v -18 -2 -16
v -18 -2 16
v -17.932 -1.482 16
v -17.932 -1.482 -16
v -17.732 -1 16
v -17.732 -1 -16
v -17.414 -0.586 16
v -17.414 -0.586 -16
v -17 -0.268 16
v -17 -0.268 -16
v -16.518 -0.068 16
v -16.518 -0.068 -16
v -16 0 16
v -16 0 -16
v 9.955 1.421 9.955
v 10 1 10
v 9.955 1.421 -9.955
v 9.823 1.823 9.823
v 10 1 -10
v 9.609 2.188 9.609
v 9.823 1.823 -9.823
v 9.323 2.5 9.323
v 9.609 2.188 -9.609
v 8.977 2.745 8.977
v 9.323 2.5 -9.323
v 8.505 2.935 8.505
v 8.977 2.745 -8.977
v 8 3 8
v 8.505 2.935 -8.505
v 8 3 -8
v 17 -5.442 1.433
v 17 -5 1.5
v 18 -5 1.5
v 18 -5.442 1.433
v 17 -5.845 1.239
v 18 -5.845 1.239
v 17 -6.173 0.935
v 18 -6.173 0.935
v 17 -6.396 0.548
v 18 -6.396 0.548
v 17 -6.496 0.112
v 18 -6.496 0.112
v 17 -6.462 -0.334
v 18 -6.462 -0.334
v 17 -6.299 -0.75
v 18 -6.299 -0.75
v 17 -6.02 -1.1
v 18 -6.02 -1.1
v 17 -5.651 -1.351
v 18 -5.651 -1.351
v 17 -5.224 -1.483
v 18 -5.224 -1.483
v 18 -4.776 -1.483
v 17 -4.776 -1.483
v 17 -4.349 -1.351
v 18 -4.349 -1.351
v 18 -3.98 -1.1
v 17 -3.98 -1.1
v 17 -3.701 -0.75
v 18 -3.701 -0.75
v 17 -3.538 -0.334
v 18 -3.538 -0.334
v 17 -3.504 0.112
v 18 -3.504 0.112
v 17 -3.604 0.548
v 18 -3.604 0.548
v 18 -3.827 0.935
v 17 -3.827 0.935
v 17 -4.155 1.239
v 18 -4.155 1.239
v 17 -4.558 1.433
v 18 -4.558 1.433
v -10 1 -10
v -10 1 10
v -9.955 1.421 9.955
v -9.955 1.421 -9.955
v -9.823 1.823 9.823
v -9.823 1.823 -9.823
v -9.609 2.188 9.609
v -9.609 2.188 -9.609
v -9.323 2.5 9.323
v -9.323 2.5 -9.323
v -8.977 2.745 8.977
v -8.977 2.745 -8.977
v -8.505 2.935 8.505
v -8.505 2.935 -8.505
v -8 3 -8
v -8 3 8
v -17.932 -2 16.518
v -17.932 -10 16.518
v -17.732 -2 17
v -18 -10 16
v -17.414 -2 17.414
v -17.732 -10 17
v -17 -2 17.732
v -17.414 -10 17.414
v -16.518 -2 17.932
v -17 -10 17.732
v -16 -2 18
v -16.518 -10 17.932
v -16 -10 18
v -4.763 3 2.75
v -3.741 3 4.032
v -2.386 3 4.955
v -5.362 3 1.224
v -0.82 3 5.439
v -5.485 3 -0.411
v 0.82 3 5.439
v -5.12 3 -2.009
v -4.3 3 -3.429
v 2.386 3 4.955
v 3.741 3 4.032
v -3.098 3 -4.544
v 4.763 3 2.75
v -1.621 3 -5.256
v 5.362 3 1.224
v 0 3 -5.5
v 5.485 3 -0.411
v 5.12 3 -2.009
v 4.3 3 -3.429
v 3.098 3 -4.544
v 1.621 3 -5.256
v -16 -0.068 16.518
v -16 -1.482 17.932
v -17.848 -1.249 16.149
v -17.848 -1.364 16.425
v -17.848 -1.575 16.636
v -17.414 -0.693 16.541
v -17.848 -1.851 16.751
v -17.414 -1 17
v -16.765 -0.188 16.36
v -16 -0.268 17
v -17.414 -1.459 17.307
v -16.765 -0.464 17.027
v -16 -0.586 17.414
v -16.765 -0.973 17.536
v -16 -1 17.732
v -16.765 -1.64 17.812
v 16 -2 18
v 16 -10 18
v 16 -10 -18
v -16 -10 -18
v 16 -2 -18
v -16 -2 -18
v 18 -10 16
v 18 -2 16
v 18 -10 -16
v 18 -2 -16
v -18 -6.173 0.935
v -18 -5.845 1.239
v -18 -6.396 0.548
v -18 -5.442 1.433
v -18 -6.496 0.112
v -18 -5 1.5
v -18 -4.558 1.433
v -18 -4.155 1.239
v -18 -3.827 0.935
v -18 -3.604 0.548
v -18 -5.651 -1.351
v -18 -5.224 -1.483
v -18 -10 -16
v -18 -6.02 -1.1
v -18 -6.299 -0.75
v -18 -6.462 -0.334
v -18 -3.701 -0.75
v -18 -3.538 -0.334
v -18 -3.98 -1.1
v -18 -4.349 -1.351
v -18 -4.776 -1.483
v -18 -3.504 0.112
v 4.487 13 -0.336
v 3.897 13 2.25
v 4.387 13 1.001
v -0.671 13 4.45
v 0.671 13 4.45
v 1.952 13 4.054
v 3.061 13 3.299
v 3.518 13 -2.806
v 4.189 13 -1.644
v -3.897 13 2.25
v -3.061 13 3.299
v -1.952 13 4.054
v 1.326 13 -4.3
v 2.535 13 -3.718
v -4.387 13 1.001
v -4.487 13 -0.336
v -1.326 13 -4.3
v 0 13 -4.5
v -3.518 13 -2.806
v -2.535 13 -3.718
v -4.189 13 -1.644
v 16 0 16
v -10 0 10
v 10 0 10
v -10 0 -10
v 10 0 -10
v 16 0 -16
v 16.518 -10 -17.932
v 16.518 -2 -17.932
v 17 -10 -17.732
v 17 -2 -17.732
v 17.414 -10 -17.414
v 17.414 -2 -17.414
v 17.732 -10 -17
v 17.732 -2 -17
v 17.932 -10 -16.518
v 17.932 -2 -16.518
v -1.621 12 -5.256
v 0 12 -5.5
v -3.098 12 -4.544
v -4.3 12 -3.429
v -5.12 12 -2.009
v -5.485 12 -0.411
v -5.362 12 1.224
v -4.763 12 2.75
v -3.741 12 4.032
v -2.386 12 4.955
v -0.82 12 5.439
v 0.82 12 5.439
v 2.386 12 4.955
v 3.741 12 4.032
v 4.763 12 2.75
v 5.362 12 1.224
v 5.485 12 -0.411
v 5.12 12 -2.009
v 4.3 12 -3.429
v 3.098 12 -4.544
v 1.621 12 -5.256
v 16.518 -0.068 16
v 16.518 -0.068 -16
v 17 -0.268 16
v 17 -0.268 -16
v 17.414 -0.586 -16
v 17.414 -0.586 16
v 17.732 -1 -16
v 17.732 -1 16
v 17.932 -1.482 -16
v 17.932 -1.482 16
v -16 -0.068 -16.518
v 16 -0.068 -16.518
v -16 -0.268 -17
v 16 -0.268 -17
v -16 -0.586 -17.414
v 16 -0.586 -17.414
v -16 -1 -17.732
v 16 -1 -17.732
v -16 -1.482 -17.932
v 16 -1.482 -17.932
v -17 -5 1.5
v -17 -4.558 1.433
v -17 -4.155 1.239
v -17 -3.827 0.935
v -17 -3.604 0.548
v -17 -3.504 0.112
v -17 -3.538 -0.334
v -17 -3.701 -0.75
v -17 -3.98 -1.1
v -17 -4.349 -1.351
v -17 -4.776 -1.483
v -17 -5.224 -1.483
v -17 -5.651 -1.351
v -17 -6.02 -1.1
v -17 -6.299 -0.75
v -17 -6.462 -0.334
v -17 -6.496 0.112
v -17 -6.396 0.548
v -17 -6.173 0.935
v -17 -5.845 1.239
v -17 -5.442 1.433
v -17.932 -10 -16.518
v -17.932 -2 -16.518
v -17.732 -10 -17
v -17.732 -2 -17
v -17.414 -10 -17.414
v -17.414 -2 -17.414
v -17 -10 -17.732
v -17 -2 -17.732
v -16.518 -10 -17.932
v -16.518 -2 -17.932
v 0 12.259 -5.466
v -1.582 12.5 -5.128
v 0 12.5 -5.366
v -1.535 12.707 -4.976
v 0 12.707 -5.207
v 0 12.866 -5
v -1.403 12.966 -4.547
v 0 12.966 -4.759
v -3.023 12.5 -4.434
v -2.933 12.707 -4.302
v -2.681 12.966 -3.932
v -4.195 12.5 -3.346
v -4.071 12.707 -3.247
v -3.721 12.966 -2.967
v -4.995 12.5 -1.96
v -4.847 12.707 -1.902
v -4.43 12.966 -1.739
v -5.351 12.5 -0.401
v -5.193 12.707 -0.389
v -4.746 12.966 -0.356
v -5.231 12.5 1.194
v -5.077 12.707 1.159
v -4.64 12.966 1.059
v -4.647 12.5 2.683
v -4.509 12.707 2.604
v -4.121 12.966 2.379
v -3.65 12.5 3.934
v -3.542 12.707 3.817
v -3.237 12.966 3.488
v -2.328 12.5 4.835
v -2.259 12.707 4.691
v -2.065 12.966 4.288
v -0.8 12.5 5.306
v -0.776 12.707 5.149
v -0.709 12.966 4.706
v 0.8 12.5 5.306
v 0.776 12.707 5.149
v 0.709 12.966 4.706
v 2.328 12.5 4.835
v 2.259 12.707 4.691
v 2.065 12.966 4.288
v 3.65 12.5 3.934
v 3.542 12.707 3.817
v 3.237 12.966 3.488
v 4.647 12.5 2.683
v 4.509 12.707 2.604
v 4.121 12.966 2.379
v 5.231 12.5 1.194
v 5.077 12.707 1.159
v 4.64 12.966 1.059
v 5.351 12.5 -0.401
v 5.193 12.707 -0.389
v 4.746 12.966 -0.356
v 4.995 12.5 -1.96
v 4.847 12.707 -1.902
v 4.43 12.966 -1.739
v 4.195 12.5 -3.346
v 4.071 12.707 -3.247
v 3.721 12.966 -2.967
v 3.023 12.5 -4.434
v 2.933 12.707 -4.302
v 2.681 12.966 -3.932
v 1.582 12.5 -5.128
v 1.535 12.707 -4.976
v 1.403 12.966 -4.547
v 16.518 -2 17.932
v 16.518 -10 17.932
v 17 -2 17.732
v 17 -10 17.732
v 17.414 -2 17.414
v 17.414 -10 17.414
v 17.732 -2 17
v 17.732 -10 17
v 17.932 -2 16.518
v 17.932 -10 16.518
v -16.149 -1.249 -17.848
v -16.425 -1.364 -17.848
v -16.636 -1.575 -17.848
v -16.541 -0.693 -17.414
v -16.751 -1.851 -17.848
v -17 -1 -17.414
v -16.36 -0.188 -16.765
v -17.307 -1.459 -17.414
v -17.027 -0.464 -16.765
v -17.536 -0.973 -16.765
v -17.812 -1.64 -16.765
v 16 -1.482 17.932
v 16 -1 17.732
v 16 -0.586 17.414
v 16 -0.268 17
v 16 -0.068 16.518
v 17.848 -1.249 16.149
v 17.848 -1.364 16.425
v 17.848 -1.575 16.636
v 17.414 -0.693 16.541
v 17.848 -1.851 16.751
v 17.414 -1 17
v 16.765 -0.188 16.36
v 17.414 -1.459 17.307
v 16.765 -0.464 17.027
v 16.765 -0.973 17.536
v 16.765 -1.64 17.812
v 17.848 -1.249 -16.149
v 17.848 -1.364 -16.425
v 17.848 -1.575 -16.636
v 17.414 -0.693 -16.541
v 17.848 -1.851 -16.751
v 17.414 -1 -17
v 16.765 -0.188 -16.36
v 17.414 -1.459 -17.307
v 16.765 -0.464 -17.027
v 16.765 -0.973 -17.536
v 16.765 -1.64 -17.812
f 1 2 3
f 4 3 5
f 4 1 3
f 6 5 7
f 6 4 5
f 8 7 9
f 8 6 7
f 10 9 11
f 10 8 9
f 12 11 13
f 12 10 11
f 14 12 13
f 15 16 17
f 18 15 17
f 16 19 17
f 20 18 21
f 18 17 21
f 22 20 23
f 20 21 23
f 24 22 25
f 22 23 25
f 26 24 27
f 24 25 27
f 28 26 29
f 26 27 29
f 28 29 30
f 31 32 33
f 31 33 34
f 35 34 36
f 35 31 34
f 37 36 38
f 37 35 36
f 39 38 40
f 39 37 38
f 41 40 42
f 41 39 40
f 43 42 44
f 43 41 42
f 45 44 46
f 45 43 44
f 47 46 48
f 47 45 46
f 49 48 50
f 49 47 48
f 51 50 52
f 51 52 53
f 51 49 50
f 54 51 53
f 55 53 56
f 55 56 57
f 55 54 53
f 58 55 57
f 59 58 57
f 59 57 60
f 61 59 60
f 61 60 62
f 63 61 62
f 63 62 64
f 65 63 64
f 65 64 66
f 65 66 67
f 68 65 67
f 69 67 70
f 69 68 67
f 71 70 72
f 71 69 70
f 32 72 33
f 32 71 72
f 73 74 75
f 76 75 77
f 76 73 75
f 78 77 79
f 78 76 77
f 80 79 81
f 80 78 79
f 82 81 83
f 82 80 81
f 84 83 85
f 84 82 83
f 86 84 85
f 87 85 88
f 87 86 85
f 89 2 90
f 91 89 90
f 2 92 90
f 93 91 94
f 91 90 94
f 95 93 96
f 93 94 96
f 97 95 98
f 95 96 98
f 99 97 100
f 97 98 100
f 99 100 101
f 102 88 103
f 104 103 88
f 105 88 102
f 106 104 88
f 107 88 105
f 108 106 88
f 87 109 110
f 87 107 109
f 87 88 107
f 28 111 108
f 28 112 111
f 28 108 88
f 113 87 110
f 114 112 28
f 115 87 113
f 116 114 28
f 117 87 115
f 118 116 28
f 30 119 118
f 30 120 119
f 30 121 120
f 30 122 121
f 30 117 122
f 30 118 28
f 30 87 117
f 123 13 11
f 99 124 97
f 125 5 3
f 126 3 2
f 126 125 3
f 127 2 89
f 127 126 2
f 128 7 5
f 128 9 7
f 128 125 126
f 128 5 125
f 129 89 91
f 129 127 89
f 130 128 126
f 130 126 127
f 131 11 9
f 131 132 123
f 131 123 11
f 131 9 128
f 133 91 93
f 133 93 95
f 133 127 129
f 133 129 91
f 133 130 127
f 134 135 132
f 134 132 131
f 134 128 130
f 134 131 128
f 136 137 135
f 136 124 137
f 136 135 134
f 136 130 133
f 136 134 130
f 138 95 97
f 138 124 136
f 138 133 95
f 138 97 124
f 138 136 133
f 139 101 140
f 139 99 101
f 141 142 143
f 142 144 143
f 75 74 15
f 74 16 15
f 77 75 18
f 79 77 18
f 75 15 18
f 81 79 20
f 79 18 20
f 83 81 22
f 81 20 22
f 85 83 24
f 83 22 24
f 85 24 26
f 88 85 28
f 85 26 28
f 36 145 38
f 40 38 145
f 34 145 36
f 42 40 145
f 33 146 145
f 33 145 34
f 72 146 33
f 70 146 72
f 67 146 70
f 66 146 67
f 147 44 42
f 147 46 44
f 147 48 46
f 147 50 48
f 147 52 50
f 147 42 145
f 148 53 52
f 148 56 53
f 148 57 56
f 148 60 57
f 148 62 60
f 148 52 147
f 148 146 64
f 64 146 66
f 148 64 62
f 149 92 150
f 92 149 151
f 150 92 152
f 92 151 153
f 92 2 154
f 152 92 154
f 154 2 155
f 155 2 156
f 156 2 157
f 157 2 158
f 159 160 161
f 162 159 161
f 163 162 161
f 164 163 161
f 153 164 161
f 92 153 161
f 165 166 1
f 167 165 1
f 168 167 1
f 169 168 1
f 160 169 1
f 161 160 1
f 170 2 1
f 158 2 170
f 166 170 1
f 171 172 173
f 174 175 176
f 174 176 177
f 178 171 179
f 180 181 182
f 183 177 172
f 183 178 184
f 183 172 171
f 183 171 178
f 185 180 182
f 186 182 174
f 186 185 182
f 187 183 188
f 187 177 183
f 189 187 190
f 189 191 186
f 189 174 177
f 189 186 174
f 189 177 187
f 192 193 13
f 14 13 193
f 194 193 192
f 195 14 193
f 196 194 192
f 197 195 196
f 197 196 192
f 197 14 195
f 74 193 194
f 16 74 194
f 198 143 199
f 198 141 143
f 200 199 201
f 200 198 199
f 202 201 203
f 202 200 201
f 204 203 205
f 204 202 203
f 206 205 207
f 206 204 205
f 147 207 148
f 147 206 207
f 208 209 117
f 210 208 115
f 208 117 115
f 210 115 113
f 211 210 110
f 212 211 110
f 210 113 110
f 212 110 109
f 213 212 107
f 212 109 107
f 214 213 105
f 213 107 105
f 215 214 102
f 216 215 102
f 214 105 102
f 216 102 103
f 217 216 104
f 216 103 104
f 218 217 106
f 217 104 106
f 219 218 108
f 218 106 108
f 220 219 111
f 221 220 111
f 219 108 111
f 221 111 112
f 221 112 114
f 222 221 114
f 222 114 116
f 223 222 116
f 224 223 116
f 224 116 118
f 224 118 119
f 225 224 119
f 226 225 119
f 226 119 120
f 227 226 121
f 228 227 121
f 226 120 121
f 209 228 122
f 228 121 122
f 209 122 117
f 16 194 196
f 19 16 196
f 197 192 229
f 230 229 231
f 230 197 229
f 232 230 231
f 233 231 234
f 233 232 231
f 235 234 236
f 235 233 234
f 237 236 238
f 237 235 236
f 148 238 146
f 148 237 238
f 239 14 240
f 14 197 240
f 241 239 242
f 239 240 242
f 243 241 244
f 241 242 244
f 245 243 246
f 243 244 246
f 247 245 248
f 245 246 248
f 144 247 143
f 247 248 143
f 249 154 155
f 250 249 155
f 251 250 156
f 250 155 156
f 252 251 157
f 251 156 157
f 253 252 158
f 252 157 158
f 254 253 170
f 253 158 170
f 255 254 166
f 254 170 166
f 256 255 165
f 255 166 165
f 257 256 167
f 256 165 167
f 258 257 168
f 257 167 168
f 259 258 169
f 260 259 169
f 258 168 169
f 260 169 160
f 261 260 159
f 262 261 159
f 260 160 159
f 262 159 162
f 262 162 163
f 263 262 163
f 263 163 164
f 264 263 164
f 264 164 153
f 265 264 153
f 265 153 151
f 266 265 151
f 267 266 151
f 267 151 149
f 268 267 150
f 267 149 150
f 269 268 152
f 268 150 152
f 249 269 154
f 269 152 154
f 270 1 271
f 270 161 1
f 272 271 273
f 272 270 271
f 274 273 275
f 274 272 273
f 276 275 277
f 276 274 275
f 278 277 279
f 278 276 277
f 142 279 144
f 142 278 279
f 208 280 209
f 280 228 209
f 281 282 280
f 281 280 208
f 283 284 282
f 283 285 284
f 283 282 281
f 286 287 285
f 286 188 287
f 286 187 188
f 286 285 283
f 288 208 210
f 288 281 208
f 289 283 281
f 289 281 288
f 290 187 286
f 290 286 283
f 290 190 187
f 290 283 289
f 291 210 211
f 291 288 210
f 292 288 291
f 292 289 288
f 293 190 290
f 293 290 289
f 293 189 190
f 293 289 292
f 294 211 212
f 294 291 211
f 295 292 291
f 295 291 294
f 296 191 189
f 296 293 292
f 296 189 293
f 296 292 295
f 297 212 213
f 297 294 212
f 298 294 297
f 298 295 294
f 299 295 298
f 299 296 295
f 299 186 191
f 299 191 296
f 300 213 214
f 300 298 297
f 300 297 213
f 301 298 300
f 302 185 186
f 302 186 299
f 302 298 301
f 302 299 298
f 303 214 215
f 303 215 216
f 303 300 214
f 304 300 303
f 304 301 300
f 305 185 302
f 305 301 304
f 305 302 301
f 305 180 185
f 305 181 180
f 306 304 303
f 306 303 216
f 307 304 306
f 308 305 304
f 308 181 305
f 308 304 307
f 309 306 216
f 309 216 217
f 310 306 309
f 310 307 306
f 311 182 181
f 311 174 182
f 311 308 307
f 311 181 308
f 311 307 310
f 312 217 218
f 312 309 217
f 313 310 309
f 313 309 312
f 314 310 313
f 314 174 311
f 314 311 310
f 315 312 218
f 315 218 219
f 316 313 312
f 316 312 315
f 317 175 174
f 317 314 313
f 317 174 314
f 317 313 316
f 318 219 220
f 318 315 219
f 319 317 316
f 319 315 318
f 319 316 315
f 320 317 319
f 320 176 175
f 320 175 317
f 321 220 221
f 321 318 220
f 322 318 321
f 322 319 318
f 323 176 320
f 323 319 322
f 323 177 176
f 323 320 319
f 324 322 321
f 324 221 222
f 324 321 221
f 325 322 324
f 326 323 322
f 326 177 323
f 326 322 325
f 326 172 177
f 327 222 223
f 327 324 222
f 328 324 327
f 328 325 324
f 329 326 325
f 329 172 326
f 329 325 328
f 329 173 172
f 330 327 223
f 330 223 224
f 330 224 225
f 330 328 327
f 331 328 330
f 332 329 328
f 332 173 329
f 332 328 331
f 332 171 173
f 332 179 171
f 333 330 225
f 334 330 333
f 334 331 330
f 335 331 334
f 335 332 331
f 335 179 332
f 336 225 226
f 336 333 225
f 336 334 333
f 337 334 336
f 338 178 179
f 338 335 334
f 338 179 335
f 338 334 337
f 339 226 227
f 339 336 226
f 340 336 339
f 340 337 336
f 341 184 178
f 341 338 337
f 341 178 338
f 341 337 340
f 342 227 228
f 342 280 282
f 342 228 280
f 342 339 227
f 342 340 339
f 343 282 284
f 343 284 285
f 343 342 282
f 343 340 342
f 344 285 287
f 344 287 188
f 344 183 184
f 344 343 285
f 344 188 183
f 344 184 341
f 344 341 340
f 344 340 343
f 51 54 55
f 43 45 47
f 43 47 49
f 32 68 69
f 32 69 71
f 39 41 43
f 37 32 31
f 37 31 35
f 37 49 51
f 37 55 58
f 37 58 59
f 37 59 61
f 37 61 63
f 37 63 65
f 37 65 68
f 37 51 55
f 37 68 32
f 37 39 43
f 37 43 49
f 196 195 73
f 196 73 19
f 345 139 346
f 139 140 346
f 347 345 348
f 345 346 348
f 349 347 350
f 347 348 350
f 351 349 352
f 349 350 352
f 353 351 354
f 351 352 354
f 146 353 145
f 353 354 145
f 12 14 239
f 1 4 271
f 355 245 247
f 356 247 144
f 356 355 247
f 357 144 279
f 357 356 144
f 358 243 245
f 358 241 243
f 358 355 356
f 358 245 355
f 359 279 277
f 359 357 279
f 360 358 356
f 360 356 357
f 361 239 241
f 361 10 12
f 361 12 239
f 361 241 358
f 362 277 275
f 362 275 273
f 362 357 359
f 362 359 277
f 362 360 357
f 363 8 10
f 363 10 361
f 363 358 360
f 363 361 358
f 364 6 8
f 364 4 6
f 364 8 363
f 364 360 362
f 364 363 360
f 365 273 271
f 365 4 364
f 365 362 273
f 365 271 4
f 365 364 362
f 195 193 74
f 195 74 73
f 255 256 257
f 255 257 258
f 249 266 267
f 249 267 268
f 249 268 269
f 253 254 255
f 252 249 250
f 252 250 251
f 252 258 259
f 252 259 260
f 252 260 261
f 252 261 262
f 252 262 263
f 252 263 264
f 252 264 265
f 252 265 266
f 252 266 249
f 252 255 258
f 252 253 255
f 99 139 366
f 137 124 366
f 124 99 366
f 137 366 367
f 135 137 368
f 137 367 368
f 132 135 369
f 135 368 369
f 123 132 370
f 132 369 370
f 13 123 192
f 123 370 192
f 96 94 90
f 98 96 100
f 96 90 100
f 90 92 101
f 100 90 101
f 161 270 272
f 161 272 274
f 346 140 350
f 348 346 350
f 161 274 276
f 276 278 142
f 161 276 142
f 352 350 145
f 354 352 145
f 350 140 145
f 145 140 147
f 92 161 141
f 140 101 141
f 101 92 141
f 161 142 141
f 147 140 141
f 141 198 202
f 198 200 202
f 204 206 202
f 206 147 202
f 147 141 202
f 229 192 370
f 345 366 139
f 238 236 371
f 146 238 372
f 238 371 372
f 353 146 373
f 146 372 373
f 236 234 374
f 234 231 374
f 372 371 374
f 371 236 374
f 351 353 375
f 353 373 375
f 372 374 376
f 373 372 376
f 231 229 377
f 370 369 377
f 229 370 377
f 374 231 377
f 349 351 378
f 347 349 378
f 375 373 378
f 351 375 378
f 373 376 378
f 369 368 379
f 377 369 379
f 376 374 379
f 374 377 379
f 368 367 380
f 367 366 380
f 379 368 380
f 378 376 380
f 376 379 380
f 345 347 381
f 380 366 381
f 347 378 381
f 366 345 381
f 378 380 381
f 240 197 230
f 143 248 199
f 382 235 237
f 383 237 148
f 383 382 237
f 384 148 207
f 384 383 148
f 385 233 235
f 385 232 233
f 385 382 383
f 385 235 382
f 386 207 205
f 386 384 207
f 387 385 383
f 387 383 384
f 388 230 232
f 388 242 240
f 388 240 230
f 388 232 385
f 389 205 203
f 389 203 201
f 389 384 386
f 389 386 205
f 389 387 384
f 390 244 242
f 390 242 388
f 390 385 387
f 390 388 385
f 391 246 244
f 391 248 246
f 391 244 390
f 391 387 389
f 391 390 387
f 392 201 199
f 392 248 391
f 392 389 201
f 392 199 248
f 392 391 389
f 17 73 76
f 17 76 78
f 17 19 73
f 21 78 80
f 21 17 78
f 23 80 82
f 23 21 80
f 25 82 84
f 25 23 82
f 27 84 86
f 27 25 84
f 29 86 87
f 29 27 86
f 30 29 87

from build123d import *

# Parameters (mm, degrees)
SKETCH_1_W          = 36
SKETCH_1_H          = 36
EXTRUDE_1_DEPTH     = 10
SKETCH_2_W          = 20
SKETCH_2_H          = 20
EXTRUDE_2_DEPTH     = 3
SKETCH_3_R          = 5.5
EXTRUDE_4_DEPTH     = 10
SKETCH_4_R          = 1.5
CUT_EXTRUDE_1_DEPTH = 1
CUT_EXTRUDE_START   = -1
SKETCH_5_R          = 1.5
CUT_EXTRUDE_2_DEPTH = 1
FILLET_1_R          = 2
FILLET_2_R          = 1


with BuildPart() as part:
    # 草图1 → 凸台-拉伸1 (new body)
    with BuildSketch(Plane(origin=(0, 0, 0), x_dir=(1, 0, 0), z_dir=(0, 1, 0))):
        Rectangle(SKETCH_1_W, SKETCH_1_H)
    extrude(amount=-EXTRUDE_1_DEPTH)

    # 草图2 → 凸台-拉伸2 (add)
    with BuildSketch(Plane(origin=(0, 0, 0), x_dir=(1, 0, 0), z_dir=(0, 1, 0))):
        Rectangle(SKETCH_2_W, SKETCH_2_H)
    extrude(amount=EXTRUDE_2_DEPTH)

    # 草图3 → 凸台-拉伸4 (add)
    with BuildSketch(Plane(origin=(0, 3, 0), x_dir=(1, 0, 0), z_dir=(0, 1, 0))):
        with Locations(Location((0, 0, 0), (0, 0, 90))):
            Circle(SKETCH_3_R)
    extrude(amount=EXTRUDE_4_DEPTH)

    # 草图4 → 切除-拉伸1 (cut)
    with BuildSketch(Plane.ZY.offset(18)):
        with Locations((0, -5)):
            Circle(SKETCH_4_R)
    extrude(amount=-CUT_EXTRUDE_1_DEPTH, mode=Mode.SUBTRACT)

    # 草图5 → 切除-拉伸2 (cut)
    with BuildSketch(Plane(origin=(18, 0, 0), x_dir=(0, 0, -1), z_dir=(1, 0, 0)).offset(CUT_EXTRUDE_START)):
        with Locations(Location((0, -5, 0), (0, 0, 180))):
            Circle(SKETCH_5_R)
    extrude(amount=CUT_EXTRUDE_2_DEPTH, mode=Mode.SUBTRACT)

    # 圆角1
    fillet_1_edges = [part.edges().sort_by_distance(p)[0] for p in [
        (10, 3, 0),
        (0, 3, -10),
        (-10, 3, 0),
        (0, 3, 10),
        (0, 0, 18),
        (-18, 0, 0),
        (0, 0, -18),
        (18, 0, 0),
        (18, -5, 18),
        (-18, -5, 18),
        (-18, -5, -18),
        (18, -5, -18),
    ]]
    fillet(fillet_1_edges, radius=FILLET_1_R)

    # 圆角2
    fillet_2_edges = [part.edges().sort_by_distance(p)[0] for p in [
        (0, 13, 5.5),
    ]]
    fillet(fillet_2_edges, radius=FILLET_2_R)


solid = part.part
